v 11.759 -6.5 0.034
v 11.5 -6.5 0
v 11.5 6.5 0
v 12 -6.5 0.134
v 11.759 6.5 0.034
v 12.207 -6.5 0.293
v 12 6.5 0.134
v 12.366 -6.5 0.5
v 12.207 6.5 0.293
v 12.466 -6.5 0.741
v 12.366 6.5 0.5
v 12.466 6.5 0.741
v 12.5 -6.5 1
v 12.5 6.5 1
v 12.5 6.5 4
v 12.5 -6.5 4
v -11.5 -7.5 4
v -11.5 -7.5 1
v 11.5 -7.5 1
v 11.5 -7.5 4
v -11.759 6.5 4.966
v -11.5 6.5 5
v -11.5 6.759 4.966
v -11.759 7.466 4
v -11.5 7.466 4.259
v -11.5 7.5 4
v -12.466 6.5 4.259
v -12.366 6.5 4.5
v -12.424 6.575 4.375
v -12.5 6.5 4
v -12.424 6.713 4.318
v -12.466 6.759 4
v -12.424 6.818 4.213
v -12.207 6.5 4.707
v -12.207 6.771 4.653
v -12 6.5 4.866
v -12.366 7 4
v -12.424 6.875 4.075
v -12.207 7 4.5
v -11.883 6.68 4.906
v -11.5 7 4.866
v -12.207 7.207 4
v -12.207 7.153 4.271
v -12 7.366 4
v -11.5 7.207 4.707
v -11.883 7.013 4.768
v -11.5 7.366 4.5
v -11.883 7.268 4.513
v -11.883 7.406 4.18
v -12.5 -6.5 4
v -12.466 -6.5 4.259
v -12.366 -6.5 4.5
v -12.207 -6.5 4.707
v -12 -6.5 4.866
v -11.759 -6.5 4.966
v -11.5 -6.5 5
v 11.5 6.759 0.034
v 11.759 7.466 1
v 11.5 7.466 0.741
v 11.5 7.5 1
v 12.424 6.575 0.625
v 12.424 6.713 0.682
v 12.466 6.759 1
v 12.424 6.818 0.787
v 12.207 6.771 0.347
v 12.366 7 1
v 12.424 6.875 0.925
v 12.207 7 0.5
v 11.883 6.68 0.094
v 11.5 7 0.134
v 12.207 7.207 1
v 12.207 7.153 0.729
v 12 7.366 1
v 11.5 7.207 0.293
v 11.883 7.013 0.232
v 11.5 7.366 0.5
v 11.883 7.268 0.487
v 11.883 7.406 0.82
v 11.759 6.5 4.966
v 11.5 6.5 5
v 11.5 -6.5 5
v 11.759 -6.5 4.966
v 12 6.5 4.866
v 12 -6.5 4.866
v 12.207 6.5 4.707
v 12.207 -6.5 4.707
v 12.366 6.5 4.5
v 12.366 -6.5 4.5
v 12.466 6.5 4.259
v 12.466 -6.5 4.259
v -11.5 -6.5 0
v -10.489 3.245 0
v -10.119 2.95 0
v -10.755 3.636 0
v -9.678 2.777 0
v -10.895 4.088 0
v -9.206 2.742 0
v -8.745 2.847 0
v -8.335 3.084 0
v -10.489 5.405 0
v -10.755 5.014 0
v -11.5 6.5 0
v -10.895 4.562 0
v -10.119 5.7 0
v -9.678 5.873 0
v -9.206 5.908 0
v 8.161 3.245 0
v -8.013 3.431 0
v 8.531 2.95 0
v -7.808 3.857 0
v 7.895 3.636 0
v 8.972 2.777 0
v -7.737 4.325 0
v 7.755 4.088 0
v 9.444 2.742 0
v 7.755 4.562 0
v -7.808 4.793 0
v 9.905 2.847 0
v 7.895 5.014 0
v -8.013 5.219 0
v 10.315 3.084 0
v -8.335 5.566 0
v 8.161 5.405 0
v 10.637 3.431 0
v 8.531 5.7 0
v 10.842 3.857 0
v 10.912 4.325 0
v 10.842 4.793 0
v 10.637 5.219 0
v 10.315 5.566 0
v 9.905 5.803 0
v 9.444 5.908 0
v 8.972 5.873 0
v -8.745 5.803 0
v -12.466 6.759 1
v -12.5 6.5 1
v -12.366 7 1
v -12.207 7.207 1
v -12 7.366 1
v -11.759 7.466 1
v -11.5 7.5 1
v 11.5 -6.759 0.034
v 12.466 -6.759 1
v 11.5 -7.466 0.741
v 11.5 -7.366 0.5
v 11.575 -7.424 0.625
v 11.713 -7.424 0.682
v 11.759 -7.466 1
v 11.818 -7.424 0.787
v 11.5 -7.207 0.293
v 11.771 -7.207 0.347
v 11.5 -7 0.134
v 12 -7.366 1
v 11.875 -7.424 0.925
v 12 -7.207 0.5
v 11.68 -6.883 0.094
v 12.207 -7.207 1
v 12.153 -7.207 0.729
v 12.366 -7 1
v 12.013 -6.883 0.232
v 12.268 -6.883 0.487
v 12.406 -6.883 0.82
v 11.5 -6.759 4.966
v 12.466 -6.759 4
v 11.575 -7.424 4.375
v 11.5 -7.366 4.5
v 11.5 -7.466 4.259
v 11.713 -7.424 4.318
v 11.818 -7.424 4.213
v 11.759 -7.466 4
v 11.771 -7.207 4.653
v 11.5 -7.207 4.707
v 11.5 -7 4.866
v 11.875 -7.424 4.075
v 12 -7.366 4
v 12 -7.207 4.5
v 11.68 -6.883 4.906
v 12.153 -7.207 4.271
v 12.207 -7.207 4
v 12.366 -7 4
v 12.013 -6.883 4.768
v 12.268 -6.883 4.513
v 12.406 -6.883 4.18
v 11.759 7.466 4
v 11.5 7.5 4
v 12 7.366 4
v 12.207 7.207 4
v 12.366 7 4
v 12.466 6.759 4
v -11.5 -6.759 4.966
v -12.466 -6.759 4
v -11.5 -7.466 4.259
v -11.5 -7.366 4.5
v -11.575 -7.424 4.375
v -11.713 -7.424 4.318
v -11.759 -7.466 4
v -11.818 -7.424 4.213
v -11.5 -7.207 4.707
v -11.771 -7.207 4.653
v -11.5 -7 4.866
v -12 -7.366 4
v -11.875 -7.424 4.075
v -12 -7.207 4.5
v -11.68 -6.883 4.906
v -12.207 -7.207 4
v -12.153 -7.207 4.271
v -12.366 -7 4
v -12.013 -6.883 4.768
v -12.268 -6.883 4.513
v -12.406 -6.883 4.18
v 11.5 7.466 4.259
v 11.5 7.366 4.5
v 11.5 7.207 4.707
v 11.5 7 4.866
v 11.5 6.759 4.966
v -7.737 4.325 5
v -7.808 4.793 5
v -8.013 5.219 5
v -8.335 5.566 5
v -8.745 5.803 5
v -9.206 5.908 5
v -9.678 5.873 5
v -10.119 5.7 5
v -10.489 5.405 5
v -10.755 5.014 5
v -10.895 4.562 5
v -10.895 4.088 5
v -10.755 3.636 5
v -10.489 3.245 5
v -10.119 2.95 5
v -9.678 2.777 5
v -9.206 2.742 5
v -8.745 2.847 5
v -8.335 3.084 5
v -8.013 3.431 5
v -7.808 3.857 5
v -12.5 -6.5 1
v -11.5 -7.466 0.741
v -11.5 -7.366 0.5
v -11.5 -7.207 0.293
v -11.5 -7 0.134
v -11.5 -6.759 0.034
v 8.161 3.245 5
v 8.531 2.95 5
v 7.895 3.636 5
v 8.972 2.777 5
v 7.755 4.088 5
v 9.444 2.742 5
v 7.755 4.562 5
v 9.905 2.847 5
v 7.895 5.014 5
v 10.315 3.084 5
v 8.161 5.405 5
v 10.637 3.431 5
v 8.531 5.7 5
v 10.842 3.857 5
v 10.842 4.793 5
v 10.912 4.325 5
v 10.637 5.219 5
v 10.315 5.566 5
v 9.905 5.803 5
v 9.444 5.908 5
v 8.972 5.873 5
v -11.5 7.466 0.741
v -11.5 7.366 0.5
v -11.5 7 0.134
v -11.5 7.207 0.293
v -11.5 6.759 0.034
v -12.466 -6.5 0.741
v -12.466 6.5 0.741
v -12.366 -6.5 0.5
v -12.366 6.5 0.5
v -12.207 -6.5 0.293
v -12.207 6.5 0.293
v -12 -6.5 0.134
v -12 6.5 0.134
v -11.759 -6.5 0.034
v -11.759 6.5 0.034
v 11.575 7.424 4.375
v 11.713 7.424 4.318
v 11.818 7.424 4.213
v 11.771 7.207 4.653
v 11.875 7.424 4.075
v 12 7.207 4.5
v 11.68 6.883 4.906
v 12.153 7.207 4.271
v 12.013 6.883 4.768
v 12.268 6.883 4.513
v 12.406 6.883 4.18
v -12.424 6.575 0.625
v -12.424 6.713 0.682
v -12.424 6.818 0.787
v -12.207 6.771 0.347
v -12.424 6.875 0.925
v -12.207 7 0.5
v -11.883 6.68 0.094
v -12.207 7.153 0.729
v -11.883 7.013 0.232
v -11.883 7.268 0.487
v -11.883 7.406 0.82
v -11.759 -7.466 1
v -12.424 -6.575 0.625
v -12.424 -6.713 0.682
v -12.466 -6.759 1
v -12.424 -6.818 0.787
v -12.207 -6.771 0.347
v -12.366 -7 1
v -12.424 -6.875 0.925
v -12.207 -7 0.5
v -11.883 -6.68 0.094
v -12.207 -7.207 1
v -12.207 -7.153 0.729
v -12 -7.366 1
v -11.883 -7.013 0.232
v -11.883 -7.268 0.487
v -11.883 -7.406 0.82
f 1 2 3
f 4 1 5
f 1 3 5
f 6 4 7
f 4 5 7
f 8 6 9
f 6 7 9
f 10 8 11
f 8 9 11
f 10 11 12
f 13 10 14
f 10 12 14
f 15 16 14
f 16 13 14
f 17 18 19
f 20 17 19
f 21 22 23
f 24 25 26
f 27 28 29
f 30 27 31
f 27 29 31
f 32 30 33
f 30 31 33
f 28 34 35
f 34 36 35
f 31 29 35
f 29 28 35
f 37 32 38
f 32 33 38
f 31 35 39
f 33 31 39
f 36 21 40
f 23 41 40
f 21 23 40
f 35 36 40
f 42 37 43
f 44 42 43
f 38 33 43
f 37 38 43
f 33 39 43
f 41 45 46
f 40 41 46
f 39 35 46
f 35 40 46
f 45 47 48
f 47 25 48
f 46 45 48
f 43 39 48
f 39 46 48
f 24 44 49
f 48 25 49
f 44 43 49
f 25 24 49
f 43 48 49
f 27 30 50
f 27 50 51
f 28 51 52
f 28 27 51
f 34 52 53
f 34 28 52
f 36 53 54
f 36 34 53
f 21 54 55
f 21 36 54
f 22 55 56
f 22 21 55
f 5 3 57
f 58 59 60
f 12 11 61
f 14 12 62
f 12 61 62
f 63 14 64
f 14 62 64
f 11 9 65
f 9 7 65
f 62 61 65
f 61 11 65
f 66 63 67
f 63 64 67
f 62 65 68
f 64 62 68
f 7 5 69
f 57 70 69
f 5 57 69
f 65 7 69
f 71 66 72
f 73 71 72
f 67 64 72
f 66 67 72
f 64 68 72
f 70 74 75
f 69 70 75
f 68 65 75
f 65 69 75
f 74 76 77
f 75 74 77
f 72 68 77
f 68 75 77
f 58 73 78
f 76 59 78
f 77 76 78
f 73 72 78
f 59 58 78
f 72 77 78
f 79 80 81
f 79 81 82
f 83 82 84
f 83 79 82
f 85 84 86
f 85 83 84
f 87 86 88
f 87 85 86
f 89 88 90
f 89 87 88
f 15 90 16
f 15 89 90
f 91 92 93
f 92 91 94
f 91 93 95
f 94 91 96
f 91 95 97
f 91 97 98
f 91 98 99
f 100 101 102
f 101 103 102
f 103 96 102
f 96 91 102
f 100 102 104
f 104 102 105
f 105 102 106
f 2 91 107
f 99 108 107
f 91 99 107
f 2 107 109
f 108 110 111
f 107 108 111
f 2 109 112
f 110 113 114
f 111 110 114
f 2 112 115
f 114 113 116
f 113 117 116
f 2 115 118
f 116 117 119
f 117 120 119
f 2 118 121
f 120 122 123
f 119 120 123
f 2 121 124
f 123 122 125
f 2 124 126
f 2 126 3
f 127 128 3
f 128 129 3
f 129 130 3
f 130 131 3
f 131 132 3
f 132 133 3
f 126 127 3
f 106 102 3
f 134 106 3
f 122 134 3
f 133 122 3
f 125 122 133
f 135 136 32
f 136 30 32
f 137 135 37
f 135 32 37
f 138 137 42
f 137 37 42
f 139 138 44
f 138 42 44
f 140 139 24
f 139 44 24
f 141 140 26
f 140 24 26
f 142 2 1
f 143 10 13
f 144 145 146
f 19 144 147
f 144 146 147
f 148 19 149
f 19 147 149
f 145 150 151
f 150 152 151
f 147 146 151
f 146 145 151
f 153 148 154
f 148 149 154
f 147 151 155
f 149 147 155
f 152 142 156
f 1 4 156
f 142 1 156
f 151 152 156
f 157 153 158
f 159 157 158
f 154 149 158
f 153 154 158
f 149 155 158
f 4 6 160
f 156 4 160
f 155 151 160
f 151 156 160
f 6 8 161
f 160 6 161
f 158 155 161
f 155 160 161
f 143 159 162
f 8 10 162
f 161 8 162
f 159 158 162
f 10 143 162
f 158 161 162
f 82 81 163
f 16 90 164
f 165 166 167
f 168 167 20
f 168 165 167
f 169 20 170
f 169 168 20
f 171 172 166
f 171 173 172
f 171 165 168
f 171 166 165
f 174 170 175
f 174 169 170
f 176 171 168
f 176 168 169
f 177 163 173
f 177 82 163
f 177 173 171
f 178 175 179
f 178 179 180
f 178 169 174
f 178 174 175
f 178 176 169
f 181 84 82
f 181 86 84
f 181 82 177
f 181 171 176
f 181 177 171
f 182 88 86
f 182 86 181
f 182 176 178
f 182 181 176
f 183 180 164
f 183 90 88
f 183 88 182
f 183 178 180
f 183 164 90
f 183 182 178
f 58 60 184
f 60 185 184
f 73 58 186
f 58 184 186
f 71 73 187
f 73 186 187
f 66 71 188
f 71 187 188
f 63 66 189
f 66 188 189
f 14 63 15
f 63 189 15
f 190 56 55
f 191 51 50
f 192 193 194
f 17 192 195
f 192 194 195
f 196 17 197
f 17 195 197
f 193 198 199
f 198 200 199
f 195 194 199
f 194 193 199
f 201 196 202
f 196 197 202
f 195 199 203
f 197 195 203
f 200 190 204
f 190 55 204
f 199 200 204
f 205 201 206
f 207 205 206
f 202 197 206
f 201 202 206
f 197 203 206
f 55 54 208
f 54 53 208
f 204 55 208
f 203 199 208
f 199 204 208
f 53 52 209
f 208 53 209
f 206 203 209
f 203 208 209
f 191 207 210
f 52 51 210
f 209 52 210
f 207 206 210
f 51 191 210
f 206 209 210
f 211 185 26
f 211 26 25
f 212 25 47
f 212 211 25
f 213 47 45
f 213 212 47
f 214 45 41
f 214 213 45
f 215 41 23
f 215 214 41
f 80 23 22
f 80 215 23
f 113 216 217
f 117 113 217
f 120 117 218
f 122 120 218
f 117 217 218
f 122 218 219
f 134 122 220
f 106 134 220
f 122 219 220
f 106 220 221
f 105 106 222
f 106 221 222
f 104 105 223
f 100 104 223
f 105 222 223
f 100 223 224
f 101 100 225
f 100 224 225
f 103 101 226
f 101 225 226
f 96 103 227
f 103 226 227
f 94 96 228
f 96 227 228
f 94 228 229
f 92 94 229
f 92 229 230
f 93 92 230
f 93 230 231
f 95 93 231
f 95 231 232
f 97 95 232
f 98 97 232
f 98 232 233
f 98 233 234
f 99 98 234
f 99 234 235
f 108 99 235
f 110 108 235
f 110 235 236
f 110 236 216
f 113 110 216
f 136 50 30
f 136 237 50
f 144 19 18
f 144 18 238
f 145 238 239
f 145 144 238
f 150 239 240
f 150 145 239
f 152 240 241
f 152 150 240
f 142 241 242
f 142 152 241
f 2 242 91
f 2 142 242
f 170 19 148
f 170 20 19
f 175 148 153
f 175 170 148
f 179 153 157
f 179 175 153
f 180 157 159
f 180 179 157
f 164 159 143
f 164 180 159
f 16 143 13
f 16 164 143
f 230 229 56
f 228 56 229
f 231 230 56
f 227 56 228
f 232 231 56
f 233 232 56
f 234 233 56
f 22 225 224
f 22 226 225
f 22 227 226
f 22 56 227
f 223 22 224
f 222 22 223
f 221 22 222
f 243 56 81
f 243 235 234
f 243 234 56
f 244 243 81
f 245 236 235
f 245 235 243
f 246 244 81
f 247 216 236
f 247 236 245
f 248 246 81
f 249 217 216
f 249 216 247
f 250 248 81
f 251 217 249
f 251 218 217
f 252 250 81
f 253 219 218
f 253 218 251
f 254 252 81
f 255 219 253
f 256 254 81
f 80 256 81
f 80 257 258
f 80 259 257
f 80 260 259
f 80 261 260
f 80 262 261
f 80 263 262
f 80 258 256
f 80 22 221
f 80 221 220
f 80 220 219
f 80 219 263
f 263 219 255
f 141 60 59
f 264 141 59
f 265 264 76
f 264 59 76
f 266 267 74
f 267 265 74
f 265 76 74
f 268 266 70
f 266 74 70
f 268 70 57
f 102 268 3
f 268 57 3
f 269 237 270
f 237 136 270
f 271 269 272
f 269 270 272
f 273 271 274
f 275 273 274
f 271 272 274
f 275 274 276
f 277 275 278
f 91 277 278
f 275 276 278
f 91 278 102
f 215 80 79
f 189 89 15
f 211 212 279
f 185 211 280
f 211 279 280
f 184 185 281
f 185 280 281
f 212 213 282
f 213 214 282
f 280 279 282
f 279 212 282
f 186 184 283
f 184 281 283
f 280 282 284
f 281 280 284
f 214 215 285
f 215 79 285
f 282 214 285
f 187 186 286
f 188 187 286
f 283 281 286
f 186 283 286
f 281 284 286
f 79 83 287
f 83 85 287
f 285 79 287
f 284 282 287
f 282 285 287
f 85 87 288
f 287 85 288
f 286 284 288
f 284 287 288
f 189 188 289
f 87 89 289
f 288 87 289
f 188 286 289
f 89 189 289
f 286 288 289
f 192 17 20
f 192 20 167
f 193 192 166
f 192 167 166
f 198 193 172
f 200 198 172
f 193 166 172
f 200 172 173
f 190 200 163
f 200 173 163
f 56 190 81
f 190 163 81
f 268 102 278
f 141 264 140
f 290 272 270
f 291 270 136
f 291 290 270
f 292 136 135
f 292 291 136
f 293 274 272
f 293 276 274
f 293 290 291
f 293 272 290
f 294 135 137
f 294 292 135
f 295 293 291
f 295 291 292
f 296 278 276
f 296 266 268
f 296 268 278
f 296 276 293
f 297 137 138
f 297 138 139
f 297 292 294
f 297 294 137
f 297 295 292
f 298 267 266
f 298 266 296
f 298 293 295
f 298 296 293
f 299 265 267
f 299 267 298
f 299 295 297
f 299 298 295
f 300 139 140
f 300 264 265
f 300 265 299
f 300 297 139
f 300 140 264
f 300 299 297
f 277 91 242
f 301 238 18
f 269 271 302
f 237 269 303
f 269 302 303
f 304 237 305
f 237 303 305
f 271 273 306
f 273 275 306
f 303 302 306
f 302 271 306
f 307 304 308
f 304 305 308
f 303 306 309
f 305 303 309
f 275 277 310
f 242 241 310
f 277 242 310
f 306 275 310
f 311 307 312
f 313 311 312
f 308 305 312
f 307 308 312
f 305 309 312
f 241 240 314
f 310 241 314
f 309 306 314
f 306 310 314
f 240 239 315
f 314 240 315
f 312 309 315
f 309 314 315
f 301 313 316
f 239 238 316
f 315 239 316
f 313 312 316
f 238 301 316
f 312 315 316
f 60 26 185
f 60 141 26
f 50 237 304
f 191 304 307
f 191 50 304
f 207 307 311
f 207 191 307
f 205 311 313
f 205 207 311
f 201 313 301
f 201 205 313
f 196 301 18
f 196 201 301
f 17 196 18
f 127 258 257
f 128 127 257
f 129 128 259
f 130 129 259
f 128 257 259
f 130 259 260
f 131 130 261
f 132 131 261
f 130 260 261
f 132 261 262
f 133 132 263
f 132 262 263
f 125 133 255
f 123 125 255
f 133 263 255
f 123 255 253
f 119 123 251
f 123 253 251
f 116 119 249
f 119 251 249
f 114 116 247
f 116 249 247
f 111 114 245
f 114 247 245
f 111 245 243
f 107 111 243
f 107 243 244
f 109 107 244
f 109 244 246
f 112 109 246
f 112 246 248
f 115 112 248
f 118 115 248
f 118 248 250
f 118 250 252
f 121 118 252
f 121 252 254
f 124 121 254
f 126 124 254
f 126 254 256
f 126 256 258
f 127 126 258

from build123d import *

# Parameters (mm, degrees)
ESBO_O1_W                = 25
ESBO_O1_H                = 15
RESSALTO_EXTRUS_O1_DEPTH = 5
ESBO_O2_R                = 1.5875
CORTE_EXTRUS_O1_DEPTH    = 16.411035007
FILETE2_R                = 1


with BuildPart() as part:
    # Esboço1 → Ressalto-extrusão1 (new body)
    with BuildSketch(Plane.XY):
        Rectangle(ESBO_O1_W, ESBO_O1_H)
    extrude(amount=RESSALTO_EXTRUS_O1_DEPTH)

    # Esboço2 → Corte-extrusão1 (cut, through all)
    with BuildSketch(Plane.XY.offset(5)):
        with Locations((-9.325, 4.325)):
            Circle(ESBO_O2_R)
        with Locations((9.325, 4.325)):
            Circle(ESBO_O2_R)
    extrude(amount=-CORTE_EXTRUS_O1_DEPTH, mode=Mode.SUBTRACT)

    # Filete2
    filete2_edges = [part.edges().sort_by_distance(p)[0] for p in [
        (12.5, 0, 5),
        (0, 7.5, 5),
        (-12.5, 0, 5),
        (0, 7.5, 0),
        (12.5, 0, 0),
        (0, -7.5, 0),
        (-12.5, 0, 0),
        (0, -7.5, 5),
        (-12.5, 7.5, 2.5),
        (12.5, 7.5, 2.5),
        (12.5, -7.5, 2.5),
        (-12.5, -7.5, 2.5),
    ]]
    fillet(filete2_edges, radius=FILETE2_R)


solid = part.part
